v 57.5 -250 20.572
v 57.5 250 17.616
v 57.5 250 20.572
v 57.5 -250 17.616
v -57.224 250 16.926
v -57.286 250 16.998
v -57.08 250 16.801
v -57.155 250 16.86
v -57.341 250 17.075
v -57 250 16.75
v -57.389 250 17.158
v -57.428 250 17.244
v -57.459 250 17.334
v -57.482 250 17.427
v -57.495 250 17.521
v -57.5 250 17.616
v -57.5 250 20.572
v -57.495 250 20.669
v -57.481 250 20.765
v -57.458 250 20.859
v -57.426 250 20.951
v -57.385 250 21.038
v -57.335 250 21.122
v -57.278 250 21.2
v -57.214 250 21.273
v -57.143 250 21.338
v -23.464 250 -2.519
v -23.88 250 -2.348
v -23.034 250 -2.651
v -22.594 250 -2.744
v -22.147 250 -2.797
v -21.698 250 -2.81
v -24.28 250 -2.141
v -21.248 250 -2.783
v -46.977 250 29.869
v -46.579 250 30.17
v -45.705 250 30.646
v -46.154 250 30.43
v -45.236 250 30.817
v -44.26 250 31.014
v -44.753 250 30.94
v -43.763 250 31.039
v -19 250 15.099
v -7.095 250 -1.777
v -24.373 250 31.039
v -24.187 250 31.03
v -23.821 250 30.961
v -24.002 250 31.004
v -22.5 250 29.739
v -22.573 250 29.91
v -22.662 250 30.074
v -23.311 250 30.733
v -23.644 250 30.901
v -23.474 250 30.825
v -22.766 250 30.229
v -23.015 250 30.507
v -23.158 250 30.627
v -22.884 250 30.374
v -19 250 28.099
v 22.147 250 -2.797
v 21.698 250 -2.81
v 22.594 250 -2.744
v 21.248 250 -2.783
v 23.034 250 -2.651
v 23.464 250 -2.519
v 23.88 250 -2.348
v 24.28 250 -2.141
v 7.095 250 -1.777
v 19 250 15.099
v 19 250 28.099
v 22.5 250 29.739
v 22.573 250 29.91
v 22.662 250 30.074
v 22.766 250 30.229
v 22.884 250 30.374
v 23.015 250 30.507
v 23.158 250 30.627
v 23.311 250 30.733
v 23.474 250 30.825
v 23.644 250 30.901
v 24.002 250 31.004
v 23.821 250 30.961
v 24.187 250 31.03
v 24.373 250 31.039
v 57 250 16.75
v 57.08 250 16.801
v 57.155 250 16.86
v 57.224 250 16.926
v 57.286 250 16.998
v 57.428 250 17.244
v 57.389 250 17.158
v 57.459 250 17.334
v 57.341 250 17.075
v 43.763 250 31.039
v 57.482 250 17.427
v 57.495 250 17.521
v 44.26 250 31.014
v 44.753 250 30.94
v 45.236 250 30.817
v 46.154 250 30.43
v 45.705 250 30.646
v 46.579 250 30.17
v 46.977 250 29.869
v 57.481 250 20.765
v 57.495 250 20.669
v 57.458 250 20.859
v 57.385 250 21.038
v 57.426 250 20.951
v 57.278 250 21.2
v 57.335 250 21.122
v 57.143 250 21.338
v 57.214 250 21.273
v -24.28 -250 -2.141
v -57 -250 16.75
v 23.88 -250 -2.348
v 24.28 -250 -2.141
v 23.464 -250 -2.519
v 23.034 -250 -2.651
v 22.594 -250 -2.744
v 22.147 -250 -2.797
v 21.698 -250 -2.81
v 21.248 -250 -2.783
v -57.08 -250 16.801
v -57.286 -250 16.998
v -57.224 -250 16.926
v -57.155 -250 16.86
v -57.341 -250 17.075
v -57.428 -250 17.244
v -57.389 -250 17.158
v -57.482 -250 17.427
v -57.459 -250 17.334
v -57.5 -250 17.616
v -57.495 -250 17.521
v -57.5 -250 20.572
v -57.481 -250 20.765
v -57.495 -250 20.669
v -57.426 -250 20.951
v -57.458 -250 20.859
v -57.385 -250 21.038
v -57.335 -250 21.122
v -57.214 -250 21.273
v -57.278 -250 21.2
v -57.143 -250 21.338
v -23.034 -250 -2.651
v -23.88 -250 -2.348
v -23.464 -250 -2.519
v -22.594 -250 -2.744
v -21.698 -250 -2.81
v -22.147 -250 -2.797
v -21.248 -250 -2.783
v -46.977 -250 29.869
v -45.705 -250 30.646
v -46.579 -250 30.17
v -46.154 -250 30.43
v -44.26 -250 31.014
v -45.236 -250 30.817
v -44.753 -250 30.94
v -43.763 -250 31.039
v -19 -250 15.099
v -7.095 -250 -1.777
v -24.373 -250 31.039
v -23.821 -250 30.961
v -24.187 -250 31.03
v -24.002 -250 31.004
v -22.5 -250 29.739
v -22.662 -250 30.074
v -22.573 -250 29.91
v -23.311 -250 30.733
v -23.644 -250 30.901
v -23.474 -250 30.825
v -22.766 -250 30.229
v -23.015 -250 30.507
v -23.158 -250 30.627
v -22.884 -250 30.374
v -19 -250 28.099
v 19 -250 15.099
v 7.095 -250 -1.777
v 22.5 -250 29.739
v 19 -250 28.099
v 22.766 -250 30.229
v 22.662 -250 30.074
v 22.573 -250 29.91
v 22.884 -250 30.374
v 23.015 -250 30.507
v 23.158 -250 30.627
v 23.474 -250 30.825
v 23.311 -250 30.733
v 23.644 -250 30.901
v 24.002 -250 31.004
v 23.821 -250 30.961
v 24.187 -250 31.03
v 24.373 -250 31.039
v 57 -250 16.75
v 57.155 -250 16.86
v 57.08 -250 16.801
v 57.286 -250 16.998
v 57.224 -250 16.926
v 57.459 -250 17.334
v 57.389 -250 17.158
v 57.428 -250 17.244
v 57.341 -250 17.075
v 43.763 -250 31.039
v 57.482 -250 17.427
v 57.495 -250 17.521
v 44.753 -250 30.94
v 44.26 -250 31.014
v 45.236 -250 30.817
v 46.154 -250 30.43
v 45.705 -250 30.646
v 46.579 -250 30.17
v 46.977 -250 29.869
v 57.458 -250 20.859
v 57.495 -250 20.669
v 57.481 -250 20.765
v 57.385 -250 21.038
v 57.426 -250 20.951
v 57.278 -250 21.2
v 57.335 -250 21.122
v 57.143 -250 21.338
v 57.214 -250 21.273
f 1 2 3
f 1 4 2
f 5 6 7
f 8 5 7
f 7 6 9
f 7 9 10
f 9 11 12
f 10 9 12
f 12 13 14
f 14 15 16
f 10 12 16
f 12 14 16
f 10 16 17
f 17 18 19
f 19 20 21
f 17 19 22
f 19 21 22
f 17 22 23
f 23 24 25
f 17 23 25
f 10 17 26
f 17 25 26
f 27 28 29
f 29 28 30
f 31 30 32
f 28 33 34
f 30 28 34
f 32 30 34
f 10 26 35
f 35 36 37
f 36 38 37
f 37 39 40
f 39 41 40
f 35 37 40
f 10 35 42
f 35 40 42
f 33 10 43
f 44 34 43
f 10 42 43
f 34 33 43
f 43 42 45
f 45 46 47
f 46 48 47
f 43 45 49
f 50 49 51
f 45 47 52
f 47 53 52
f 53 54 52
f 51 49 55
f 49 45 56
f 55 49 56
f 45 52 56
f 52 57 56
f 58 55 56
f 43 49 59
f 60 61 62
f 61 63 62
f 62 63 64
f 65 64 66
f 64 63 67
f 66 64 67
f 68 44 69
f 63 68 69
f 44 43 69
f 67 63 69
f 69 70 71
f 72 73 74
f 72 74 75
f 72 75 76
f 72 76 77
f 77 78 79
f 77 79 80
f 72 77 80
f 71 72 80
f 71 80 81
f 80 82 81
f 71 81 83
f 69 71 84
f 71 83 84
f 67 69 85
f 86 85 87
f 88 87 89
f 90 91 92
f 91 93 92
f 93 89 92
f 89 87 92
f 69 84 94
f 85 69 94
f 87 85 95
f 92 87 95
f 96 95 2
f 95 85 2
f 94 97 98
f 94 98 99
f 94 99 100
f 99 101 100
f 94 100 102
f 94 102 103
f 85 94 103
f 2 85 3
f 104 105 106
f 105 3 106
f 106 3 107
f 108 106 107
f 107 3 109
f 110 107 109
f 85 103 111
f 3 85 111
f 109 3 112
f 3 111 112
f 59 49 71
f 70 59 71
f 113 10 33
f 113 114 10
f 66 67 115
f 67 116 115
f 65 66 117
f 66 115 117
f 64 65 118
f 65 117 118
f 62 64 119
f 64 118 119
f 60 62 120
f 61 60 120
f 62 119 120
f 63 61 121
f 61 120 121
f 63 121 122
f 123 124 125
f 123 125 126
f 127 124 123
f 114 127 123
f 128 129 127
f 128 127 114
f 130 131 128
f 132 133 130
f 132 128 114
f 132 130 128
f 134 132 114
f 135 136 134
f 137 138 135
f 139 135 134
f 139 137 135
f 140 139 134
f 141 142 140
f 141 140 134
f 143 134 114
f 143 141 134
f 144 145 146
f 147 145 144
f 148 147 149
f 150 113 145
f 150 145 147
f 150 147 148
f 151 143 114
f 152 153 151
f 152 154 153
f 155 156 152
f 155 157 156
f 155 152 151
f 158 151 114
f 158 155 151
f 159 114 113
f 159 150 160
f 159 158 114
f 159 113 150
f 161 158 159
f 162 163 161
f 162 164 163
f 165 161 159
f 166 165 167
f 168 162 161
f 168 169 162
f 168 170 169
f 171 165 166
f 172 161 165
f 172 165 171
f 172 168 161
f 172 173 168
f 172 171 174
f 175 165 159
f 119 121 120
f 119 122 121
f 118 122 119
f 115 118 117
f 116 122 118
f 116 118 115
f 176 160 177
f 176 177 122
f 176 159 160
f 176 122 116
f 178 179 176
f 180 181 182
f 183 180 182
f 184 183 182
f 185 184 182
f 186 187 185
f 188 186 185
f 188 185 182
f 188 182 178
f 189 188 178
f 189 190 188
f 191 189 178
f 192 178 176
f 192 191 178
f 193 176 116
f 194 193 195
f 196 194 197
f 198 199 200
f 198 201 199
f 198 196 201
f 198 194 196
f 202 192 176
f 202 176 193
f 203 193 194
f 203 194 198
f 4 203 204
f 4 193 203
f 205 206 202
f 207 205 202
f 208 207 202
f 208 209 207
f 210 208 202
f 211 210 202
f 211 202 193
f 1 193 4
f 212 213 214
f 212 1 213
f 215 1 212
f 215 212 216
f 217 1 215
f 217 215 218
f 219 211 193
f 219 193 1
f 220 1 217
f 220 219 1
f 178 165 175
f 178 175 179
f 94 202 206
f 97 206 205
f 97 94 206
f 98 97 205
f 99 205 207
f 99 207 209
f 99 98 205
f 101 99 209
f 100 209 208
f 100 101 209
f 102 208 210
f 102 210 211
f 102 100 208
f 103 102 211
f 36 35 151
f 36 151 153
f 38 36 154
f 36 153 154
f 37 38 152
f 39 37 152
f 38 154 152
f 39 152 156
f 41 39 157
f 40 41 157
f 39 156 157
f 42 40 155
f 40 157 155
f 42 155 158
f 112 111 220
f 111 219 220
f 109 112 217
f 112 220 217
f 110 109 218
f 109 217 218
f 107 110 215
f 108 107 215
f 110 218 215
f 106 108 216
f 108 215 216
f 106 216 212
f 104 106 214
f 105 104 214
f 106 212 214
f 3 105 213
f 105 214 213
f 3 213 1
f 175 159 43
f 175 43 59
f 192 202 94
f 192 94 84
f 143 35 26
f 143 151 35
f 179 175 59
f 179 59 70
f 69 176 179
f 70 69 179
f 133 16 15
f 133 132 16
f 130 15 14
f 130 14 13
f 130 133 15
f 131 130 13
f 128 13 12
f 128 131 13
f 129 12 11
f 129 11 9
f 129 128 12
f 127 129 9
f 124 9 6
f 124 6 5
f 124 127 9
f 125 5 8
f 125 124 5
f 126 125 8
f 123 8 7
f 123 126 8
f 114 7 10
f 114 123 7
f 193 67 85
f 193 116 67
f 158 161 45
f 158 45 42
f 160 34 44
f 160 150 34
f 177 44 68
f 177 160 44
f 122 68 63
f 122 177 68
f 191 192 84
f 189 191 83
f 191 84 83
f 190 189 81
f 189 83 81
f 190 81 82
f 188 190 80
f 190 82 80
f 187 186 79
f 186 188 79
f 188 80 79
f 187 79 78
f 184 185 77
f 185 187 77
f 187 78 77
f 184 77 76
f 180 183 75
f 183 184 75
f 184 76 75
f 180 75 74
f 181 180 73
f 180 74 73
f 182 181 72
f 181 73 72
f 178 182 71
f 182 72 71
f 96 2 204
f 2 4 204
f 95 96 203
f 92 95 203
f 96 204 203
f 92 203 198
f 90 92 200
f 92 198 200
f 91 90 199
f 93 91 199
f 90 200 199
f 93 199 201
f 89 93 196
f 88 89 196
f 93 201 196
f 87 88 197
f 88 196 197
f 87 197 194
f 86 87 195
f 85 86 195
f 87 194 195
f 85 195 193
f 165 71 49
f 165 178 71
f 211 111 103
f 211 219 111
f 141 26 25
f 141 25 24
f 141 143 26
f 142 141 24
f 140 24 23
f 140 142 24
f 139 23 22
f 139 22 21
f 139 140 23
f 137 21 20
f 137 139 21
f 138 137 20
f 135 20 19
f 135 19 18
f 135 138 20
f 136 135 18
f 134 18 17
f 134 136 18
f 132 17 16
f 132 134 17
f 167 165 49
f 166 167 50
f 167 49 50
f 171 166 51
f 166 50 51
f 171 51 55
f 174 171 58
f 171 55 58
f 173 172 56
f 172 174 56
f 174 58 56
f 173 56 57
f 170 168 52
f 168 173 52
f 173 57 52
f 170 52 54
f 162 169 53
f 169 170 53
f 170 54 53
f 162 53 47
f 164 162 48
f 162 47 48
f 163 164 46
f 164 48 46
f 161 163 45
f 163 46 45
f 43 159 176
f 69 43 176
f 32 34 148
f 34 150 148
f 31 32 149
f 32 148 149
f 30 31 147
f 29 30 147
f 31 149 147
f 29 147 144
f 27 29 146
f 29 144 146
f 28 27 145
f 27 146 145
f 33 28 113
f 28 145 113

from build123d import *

# Parameters (mm, degrees)
F1_DEPTH    = 250
F2_R        = 5
F3_R        = 1
F4_W        = 38
F4_H        = 13
F5_DEPTH    = 500.001
F6_T1_DEPTH = 509.3674969976


# Not quite as in the source:
# - a fillet or chamfer that OpenCascade refuses, or shapes differently, is made with other operations: its cross-section is extruded or revolved along the edge and cut away or added


with BuildPart() as f1:
    # F0 (on Front) → F1 (new body, symmetric)
    with BuildSketch(Plane.XZ):
        with BuildLine():
            Line((22.5, 29.7386717319), (0, 29.7386717319))
            Line((0, 29.7386717319), (-22.5, 29.7386717319))
            Line((-22.5, 29.7386717319), (-22.5, 31.0386717319))
            Line((-22.5, 31.0386717319), (-45.5824640741, 31.0386717319))
            Line((-45.5824640741, 31.0386717319), (-57.5, 21.0386717319))
            Line((-57.5, 21.0386717319), (-57.5, 17.0386717319))
            Line((-57.5, 17.0386717319), (-22.8589838486, -2.9613282681))
            ThreePointArc((-22.8589838486, -2.9613282681), (0, -1.6507010523), (22.8589838486, -2.9613282681))
            Line((22.8589838486, -2.9613282681), (57.5, 17.0386717319))
            Line((57.5, 17.0386717319), (57.5, 21.0386717319))
            Line((57.5, 21.0386717319), (45.5824640741, 31.0386717319))
            Line((45.5824640741, 31.0386717319), (22.5, 31.0386717319))
            Line((22.5, 31.0386717319), (22.5, 29.7386717319))
        make_face()
    extrude(amount=F1_DEPTH, both=True)

    # F2
    f2_edges = [f1.edges().sort_by_distance(p)[0] for p in [
        (45.582464, 0, 31.038672),
        (22.858984, 0, -2.961328),
        (-45.582464, 0, 31.038672),
        (-22.858984, 0, -2.961328),
    ]]
    fillet(f2_edges, radius=F2_R)

    # F3
    f3_edges = [f1.edges().sort_by_distance(p)[0] for p in [
        (57.5, 0, 21.038672),
        (57.5, 0, 17.038672),
        (-57.5, 0, 21.038672),
        (-57.5, 0, 17.038672),
    ]]
    fillet(f3_edges, radius=F3_R)

    # F4 (on face) → F5 (cut, through all)
    with BuildSketch(Plane.XZ.offset(250)):
        with Locations((0, 21.5986846235)):
            Rectangle(F4_W, F4_H)
    extrude(amount=-F5_DEPTH, mode=Mode.SUBTRACT)

    # F6: fillet of radius 2 on 2 edges, made by hand

    # F6_s2 → F6_t1 (cut)
    with BuildSketch(Plane.XZ.offset(-254.6837484988)):
        with BuildLine():
            ThreePointArc((-22.5, 29.7386717319), (-23.2333239744, 30.6818394045), (-24.3734993995, 31.0386717319))
            Line((-24.3734993995, 31.0386717319), (-22.5, 31.0386717319))
            Line((-22.5, 31.0386717319), (-22.5, 29.7386717319))
        make_face()
        with BuildLine():
            ThreePointArc((24.3734993995, 31.0386717319), (23.2333239744, 30.6818394045), (22.5, 29.7386717319))
            Line((22.5, 29.7386717319), (22.5, 31.0386717319))
            Line((22.5, 31.0386717319), (24.3734993995, 31.0386717319))
        make_face()
    extrude(amount=F6_T1_DEPTH, mode=Mode.SUBTRACT)


solid = f1.part
